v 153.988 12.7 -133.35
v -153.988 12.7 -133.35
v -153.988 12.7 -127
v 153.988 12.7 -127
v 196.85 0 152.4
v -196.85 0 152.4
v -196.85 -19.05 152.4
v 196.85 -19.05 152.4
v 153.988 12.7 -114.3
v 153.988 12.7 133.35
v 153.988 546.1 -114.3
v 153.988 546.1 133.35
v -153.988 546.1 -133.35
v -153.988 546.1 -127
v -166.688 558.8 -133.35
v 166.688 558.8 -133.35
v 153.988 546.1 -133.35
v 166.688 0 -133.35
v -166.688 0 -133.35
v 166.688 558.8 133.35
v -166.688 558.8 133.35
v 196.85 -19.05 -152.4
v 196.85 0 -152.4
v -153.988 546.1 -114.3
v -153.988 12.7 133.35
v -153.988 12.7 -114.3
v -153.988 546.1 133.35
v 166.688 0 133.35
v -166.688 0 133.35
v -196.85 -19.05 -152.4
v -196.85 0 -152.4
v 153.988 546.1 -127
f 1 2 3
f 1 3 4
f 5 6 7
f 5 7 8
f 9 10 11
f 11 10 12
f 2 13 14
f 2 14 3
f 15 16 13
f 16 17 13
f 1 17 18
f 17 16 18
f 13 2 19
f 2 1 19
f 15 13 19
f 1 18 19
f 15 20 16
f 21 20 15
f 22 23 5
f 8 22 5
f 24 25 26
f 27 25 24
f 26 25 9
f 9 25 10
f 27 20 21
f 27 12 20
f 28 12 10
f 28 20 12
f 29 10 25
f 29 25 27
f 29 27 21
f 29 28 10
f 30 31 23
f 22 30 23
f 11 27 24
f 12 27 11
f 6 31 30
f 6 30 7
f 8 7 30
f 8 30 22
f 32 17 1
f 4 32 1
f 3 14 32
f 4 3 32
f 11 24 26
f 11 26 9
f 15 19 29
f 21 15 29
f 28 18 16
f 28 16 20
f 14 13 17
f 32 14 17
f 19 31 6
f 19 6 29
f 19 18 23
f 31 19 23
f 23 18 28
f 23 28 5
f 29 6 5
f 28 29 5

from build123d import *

# Parameters (mm, degrees)
F0_W     = 393.7
F0_H     = 304.8
F1_DEPTH = 19.05
F2_W     = 333.375
F2_H     = 266.7
F3_DEPTH = 558.8
F4_W     = 307.975
F4_H     = 533.4
F5_DEPTH = 247.65
F6_W     = 307.975
F6_H     = 533.4
F7_DEPTH = 6.35


with BuildPart() as f1:
    # F0 (on Front) → F1 (new body)
    with BuildSketch(Plane.XZ):
        Rectangle(F0_W, F0_H)
    extrude(amount=F1_DEPTH)

    # F2 (on face) → F3 (join)
    with BuildSketch(Plane(origin=(0, 0, 0), x_dir=(-1, 0, 0), z_dir=(0, 1, 0))):
        Rectangle(F2_W, F2_H)
    extrude(amount=F3_DEPTH)

    # F4 (on face) → F5 (cut)
    with BuildSketch(Plane.XY.offset(133.35)):
        with Locations((0, 279.4)):
            Rectangle(F4_W, F4_H)
    extrude(amount=-F5_DEPTH, mode=Mode.SUBTRACT)

    # F6 (on face) → F7 (cut)
    with BuildSketch(Plane(origin=(0, 0, -133.35), x_dir=(1, 0, 0), z_dir=(0, 0, -1))):
        with Locations((0, -279.4)):
            Rectangle(F6_W, F6_H)
    extrude(amount=-F7_DEPTH, mode=Mode.SUBTRACT)


solid = f1.part
